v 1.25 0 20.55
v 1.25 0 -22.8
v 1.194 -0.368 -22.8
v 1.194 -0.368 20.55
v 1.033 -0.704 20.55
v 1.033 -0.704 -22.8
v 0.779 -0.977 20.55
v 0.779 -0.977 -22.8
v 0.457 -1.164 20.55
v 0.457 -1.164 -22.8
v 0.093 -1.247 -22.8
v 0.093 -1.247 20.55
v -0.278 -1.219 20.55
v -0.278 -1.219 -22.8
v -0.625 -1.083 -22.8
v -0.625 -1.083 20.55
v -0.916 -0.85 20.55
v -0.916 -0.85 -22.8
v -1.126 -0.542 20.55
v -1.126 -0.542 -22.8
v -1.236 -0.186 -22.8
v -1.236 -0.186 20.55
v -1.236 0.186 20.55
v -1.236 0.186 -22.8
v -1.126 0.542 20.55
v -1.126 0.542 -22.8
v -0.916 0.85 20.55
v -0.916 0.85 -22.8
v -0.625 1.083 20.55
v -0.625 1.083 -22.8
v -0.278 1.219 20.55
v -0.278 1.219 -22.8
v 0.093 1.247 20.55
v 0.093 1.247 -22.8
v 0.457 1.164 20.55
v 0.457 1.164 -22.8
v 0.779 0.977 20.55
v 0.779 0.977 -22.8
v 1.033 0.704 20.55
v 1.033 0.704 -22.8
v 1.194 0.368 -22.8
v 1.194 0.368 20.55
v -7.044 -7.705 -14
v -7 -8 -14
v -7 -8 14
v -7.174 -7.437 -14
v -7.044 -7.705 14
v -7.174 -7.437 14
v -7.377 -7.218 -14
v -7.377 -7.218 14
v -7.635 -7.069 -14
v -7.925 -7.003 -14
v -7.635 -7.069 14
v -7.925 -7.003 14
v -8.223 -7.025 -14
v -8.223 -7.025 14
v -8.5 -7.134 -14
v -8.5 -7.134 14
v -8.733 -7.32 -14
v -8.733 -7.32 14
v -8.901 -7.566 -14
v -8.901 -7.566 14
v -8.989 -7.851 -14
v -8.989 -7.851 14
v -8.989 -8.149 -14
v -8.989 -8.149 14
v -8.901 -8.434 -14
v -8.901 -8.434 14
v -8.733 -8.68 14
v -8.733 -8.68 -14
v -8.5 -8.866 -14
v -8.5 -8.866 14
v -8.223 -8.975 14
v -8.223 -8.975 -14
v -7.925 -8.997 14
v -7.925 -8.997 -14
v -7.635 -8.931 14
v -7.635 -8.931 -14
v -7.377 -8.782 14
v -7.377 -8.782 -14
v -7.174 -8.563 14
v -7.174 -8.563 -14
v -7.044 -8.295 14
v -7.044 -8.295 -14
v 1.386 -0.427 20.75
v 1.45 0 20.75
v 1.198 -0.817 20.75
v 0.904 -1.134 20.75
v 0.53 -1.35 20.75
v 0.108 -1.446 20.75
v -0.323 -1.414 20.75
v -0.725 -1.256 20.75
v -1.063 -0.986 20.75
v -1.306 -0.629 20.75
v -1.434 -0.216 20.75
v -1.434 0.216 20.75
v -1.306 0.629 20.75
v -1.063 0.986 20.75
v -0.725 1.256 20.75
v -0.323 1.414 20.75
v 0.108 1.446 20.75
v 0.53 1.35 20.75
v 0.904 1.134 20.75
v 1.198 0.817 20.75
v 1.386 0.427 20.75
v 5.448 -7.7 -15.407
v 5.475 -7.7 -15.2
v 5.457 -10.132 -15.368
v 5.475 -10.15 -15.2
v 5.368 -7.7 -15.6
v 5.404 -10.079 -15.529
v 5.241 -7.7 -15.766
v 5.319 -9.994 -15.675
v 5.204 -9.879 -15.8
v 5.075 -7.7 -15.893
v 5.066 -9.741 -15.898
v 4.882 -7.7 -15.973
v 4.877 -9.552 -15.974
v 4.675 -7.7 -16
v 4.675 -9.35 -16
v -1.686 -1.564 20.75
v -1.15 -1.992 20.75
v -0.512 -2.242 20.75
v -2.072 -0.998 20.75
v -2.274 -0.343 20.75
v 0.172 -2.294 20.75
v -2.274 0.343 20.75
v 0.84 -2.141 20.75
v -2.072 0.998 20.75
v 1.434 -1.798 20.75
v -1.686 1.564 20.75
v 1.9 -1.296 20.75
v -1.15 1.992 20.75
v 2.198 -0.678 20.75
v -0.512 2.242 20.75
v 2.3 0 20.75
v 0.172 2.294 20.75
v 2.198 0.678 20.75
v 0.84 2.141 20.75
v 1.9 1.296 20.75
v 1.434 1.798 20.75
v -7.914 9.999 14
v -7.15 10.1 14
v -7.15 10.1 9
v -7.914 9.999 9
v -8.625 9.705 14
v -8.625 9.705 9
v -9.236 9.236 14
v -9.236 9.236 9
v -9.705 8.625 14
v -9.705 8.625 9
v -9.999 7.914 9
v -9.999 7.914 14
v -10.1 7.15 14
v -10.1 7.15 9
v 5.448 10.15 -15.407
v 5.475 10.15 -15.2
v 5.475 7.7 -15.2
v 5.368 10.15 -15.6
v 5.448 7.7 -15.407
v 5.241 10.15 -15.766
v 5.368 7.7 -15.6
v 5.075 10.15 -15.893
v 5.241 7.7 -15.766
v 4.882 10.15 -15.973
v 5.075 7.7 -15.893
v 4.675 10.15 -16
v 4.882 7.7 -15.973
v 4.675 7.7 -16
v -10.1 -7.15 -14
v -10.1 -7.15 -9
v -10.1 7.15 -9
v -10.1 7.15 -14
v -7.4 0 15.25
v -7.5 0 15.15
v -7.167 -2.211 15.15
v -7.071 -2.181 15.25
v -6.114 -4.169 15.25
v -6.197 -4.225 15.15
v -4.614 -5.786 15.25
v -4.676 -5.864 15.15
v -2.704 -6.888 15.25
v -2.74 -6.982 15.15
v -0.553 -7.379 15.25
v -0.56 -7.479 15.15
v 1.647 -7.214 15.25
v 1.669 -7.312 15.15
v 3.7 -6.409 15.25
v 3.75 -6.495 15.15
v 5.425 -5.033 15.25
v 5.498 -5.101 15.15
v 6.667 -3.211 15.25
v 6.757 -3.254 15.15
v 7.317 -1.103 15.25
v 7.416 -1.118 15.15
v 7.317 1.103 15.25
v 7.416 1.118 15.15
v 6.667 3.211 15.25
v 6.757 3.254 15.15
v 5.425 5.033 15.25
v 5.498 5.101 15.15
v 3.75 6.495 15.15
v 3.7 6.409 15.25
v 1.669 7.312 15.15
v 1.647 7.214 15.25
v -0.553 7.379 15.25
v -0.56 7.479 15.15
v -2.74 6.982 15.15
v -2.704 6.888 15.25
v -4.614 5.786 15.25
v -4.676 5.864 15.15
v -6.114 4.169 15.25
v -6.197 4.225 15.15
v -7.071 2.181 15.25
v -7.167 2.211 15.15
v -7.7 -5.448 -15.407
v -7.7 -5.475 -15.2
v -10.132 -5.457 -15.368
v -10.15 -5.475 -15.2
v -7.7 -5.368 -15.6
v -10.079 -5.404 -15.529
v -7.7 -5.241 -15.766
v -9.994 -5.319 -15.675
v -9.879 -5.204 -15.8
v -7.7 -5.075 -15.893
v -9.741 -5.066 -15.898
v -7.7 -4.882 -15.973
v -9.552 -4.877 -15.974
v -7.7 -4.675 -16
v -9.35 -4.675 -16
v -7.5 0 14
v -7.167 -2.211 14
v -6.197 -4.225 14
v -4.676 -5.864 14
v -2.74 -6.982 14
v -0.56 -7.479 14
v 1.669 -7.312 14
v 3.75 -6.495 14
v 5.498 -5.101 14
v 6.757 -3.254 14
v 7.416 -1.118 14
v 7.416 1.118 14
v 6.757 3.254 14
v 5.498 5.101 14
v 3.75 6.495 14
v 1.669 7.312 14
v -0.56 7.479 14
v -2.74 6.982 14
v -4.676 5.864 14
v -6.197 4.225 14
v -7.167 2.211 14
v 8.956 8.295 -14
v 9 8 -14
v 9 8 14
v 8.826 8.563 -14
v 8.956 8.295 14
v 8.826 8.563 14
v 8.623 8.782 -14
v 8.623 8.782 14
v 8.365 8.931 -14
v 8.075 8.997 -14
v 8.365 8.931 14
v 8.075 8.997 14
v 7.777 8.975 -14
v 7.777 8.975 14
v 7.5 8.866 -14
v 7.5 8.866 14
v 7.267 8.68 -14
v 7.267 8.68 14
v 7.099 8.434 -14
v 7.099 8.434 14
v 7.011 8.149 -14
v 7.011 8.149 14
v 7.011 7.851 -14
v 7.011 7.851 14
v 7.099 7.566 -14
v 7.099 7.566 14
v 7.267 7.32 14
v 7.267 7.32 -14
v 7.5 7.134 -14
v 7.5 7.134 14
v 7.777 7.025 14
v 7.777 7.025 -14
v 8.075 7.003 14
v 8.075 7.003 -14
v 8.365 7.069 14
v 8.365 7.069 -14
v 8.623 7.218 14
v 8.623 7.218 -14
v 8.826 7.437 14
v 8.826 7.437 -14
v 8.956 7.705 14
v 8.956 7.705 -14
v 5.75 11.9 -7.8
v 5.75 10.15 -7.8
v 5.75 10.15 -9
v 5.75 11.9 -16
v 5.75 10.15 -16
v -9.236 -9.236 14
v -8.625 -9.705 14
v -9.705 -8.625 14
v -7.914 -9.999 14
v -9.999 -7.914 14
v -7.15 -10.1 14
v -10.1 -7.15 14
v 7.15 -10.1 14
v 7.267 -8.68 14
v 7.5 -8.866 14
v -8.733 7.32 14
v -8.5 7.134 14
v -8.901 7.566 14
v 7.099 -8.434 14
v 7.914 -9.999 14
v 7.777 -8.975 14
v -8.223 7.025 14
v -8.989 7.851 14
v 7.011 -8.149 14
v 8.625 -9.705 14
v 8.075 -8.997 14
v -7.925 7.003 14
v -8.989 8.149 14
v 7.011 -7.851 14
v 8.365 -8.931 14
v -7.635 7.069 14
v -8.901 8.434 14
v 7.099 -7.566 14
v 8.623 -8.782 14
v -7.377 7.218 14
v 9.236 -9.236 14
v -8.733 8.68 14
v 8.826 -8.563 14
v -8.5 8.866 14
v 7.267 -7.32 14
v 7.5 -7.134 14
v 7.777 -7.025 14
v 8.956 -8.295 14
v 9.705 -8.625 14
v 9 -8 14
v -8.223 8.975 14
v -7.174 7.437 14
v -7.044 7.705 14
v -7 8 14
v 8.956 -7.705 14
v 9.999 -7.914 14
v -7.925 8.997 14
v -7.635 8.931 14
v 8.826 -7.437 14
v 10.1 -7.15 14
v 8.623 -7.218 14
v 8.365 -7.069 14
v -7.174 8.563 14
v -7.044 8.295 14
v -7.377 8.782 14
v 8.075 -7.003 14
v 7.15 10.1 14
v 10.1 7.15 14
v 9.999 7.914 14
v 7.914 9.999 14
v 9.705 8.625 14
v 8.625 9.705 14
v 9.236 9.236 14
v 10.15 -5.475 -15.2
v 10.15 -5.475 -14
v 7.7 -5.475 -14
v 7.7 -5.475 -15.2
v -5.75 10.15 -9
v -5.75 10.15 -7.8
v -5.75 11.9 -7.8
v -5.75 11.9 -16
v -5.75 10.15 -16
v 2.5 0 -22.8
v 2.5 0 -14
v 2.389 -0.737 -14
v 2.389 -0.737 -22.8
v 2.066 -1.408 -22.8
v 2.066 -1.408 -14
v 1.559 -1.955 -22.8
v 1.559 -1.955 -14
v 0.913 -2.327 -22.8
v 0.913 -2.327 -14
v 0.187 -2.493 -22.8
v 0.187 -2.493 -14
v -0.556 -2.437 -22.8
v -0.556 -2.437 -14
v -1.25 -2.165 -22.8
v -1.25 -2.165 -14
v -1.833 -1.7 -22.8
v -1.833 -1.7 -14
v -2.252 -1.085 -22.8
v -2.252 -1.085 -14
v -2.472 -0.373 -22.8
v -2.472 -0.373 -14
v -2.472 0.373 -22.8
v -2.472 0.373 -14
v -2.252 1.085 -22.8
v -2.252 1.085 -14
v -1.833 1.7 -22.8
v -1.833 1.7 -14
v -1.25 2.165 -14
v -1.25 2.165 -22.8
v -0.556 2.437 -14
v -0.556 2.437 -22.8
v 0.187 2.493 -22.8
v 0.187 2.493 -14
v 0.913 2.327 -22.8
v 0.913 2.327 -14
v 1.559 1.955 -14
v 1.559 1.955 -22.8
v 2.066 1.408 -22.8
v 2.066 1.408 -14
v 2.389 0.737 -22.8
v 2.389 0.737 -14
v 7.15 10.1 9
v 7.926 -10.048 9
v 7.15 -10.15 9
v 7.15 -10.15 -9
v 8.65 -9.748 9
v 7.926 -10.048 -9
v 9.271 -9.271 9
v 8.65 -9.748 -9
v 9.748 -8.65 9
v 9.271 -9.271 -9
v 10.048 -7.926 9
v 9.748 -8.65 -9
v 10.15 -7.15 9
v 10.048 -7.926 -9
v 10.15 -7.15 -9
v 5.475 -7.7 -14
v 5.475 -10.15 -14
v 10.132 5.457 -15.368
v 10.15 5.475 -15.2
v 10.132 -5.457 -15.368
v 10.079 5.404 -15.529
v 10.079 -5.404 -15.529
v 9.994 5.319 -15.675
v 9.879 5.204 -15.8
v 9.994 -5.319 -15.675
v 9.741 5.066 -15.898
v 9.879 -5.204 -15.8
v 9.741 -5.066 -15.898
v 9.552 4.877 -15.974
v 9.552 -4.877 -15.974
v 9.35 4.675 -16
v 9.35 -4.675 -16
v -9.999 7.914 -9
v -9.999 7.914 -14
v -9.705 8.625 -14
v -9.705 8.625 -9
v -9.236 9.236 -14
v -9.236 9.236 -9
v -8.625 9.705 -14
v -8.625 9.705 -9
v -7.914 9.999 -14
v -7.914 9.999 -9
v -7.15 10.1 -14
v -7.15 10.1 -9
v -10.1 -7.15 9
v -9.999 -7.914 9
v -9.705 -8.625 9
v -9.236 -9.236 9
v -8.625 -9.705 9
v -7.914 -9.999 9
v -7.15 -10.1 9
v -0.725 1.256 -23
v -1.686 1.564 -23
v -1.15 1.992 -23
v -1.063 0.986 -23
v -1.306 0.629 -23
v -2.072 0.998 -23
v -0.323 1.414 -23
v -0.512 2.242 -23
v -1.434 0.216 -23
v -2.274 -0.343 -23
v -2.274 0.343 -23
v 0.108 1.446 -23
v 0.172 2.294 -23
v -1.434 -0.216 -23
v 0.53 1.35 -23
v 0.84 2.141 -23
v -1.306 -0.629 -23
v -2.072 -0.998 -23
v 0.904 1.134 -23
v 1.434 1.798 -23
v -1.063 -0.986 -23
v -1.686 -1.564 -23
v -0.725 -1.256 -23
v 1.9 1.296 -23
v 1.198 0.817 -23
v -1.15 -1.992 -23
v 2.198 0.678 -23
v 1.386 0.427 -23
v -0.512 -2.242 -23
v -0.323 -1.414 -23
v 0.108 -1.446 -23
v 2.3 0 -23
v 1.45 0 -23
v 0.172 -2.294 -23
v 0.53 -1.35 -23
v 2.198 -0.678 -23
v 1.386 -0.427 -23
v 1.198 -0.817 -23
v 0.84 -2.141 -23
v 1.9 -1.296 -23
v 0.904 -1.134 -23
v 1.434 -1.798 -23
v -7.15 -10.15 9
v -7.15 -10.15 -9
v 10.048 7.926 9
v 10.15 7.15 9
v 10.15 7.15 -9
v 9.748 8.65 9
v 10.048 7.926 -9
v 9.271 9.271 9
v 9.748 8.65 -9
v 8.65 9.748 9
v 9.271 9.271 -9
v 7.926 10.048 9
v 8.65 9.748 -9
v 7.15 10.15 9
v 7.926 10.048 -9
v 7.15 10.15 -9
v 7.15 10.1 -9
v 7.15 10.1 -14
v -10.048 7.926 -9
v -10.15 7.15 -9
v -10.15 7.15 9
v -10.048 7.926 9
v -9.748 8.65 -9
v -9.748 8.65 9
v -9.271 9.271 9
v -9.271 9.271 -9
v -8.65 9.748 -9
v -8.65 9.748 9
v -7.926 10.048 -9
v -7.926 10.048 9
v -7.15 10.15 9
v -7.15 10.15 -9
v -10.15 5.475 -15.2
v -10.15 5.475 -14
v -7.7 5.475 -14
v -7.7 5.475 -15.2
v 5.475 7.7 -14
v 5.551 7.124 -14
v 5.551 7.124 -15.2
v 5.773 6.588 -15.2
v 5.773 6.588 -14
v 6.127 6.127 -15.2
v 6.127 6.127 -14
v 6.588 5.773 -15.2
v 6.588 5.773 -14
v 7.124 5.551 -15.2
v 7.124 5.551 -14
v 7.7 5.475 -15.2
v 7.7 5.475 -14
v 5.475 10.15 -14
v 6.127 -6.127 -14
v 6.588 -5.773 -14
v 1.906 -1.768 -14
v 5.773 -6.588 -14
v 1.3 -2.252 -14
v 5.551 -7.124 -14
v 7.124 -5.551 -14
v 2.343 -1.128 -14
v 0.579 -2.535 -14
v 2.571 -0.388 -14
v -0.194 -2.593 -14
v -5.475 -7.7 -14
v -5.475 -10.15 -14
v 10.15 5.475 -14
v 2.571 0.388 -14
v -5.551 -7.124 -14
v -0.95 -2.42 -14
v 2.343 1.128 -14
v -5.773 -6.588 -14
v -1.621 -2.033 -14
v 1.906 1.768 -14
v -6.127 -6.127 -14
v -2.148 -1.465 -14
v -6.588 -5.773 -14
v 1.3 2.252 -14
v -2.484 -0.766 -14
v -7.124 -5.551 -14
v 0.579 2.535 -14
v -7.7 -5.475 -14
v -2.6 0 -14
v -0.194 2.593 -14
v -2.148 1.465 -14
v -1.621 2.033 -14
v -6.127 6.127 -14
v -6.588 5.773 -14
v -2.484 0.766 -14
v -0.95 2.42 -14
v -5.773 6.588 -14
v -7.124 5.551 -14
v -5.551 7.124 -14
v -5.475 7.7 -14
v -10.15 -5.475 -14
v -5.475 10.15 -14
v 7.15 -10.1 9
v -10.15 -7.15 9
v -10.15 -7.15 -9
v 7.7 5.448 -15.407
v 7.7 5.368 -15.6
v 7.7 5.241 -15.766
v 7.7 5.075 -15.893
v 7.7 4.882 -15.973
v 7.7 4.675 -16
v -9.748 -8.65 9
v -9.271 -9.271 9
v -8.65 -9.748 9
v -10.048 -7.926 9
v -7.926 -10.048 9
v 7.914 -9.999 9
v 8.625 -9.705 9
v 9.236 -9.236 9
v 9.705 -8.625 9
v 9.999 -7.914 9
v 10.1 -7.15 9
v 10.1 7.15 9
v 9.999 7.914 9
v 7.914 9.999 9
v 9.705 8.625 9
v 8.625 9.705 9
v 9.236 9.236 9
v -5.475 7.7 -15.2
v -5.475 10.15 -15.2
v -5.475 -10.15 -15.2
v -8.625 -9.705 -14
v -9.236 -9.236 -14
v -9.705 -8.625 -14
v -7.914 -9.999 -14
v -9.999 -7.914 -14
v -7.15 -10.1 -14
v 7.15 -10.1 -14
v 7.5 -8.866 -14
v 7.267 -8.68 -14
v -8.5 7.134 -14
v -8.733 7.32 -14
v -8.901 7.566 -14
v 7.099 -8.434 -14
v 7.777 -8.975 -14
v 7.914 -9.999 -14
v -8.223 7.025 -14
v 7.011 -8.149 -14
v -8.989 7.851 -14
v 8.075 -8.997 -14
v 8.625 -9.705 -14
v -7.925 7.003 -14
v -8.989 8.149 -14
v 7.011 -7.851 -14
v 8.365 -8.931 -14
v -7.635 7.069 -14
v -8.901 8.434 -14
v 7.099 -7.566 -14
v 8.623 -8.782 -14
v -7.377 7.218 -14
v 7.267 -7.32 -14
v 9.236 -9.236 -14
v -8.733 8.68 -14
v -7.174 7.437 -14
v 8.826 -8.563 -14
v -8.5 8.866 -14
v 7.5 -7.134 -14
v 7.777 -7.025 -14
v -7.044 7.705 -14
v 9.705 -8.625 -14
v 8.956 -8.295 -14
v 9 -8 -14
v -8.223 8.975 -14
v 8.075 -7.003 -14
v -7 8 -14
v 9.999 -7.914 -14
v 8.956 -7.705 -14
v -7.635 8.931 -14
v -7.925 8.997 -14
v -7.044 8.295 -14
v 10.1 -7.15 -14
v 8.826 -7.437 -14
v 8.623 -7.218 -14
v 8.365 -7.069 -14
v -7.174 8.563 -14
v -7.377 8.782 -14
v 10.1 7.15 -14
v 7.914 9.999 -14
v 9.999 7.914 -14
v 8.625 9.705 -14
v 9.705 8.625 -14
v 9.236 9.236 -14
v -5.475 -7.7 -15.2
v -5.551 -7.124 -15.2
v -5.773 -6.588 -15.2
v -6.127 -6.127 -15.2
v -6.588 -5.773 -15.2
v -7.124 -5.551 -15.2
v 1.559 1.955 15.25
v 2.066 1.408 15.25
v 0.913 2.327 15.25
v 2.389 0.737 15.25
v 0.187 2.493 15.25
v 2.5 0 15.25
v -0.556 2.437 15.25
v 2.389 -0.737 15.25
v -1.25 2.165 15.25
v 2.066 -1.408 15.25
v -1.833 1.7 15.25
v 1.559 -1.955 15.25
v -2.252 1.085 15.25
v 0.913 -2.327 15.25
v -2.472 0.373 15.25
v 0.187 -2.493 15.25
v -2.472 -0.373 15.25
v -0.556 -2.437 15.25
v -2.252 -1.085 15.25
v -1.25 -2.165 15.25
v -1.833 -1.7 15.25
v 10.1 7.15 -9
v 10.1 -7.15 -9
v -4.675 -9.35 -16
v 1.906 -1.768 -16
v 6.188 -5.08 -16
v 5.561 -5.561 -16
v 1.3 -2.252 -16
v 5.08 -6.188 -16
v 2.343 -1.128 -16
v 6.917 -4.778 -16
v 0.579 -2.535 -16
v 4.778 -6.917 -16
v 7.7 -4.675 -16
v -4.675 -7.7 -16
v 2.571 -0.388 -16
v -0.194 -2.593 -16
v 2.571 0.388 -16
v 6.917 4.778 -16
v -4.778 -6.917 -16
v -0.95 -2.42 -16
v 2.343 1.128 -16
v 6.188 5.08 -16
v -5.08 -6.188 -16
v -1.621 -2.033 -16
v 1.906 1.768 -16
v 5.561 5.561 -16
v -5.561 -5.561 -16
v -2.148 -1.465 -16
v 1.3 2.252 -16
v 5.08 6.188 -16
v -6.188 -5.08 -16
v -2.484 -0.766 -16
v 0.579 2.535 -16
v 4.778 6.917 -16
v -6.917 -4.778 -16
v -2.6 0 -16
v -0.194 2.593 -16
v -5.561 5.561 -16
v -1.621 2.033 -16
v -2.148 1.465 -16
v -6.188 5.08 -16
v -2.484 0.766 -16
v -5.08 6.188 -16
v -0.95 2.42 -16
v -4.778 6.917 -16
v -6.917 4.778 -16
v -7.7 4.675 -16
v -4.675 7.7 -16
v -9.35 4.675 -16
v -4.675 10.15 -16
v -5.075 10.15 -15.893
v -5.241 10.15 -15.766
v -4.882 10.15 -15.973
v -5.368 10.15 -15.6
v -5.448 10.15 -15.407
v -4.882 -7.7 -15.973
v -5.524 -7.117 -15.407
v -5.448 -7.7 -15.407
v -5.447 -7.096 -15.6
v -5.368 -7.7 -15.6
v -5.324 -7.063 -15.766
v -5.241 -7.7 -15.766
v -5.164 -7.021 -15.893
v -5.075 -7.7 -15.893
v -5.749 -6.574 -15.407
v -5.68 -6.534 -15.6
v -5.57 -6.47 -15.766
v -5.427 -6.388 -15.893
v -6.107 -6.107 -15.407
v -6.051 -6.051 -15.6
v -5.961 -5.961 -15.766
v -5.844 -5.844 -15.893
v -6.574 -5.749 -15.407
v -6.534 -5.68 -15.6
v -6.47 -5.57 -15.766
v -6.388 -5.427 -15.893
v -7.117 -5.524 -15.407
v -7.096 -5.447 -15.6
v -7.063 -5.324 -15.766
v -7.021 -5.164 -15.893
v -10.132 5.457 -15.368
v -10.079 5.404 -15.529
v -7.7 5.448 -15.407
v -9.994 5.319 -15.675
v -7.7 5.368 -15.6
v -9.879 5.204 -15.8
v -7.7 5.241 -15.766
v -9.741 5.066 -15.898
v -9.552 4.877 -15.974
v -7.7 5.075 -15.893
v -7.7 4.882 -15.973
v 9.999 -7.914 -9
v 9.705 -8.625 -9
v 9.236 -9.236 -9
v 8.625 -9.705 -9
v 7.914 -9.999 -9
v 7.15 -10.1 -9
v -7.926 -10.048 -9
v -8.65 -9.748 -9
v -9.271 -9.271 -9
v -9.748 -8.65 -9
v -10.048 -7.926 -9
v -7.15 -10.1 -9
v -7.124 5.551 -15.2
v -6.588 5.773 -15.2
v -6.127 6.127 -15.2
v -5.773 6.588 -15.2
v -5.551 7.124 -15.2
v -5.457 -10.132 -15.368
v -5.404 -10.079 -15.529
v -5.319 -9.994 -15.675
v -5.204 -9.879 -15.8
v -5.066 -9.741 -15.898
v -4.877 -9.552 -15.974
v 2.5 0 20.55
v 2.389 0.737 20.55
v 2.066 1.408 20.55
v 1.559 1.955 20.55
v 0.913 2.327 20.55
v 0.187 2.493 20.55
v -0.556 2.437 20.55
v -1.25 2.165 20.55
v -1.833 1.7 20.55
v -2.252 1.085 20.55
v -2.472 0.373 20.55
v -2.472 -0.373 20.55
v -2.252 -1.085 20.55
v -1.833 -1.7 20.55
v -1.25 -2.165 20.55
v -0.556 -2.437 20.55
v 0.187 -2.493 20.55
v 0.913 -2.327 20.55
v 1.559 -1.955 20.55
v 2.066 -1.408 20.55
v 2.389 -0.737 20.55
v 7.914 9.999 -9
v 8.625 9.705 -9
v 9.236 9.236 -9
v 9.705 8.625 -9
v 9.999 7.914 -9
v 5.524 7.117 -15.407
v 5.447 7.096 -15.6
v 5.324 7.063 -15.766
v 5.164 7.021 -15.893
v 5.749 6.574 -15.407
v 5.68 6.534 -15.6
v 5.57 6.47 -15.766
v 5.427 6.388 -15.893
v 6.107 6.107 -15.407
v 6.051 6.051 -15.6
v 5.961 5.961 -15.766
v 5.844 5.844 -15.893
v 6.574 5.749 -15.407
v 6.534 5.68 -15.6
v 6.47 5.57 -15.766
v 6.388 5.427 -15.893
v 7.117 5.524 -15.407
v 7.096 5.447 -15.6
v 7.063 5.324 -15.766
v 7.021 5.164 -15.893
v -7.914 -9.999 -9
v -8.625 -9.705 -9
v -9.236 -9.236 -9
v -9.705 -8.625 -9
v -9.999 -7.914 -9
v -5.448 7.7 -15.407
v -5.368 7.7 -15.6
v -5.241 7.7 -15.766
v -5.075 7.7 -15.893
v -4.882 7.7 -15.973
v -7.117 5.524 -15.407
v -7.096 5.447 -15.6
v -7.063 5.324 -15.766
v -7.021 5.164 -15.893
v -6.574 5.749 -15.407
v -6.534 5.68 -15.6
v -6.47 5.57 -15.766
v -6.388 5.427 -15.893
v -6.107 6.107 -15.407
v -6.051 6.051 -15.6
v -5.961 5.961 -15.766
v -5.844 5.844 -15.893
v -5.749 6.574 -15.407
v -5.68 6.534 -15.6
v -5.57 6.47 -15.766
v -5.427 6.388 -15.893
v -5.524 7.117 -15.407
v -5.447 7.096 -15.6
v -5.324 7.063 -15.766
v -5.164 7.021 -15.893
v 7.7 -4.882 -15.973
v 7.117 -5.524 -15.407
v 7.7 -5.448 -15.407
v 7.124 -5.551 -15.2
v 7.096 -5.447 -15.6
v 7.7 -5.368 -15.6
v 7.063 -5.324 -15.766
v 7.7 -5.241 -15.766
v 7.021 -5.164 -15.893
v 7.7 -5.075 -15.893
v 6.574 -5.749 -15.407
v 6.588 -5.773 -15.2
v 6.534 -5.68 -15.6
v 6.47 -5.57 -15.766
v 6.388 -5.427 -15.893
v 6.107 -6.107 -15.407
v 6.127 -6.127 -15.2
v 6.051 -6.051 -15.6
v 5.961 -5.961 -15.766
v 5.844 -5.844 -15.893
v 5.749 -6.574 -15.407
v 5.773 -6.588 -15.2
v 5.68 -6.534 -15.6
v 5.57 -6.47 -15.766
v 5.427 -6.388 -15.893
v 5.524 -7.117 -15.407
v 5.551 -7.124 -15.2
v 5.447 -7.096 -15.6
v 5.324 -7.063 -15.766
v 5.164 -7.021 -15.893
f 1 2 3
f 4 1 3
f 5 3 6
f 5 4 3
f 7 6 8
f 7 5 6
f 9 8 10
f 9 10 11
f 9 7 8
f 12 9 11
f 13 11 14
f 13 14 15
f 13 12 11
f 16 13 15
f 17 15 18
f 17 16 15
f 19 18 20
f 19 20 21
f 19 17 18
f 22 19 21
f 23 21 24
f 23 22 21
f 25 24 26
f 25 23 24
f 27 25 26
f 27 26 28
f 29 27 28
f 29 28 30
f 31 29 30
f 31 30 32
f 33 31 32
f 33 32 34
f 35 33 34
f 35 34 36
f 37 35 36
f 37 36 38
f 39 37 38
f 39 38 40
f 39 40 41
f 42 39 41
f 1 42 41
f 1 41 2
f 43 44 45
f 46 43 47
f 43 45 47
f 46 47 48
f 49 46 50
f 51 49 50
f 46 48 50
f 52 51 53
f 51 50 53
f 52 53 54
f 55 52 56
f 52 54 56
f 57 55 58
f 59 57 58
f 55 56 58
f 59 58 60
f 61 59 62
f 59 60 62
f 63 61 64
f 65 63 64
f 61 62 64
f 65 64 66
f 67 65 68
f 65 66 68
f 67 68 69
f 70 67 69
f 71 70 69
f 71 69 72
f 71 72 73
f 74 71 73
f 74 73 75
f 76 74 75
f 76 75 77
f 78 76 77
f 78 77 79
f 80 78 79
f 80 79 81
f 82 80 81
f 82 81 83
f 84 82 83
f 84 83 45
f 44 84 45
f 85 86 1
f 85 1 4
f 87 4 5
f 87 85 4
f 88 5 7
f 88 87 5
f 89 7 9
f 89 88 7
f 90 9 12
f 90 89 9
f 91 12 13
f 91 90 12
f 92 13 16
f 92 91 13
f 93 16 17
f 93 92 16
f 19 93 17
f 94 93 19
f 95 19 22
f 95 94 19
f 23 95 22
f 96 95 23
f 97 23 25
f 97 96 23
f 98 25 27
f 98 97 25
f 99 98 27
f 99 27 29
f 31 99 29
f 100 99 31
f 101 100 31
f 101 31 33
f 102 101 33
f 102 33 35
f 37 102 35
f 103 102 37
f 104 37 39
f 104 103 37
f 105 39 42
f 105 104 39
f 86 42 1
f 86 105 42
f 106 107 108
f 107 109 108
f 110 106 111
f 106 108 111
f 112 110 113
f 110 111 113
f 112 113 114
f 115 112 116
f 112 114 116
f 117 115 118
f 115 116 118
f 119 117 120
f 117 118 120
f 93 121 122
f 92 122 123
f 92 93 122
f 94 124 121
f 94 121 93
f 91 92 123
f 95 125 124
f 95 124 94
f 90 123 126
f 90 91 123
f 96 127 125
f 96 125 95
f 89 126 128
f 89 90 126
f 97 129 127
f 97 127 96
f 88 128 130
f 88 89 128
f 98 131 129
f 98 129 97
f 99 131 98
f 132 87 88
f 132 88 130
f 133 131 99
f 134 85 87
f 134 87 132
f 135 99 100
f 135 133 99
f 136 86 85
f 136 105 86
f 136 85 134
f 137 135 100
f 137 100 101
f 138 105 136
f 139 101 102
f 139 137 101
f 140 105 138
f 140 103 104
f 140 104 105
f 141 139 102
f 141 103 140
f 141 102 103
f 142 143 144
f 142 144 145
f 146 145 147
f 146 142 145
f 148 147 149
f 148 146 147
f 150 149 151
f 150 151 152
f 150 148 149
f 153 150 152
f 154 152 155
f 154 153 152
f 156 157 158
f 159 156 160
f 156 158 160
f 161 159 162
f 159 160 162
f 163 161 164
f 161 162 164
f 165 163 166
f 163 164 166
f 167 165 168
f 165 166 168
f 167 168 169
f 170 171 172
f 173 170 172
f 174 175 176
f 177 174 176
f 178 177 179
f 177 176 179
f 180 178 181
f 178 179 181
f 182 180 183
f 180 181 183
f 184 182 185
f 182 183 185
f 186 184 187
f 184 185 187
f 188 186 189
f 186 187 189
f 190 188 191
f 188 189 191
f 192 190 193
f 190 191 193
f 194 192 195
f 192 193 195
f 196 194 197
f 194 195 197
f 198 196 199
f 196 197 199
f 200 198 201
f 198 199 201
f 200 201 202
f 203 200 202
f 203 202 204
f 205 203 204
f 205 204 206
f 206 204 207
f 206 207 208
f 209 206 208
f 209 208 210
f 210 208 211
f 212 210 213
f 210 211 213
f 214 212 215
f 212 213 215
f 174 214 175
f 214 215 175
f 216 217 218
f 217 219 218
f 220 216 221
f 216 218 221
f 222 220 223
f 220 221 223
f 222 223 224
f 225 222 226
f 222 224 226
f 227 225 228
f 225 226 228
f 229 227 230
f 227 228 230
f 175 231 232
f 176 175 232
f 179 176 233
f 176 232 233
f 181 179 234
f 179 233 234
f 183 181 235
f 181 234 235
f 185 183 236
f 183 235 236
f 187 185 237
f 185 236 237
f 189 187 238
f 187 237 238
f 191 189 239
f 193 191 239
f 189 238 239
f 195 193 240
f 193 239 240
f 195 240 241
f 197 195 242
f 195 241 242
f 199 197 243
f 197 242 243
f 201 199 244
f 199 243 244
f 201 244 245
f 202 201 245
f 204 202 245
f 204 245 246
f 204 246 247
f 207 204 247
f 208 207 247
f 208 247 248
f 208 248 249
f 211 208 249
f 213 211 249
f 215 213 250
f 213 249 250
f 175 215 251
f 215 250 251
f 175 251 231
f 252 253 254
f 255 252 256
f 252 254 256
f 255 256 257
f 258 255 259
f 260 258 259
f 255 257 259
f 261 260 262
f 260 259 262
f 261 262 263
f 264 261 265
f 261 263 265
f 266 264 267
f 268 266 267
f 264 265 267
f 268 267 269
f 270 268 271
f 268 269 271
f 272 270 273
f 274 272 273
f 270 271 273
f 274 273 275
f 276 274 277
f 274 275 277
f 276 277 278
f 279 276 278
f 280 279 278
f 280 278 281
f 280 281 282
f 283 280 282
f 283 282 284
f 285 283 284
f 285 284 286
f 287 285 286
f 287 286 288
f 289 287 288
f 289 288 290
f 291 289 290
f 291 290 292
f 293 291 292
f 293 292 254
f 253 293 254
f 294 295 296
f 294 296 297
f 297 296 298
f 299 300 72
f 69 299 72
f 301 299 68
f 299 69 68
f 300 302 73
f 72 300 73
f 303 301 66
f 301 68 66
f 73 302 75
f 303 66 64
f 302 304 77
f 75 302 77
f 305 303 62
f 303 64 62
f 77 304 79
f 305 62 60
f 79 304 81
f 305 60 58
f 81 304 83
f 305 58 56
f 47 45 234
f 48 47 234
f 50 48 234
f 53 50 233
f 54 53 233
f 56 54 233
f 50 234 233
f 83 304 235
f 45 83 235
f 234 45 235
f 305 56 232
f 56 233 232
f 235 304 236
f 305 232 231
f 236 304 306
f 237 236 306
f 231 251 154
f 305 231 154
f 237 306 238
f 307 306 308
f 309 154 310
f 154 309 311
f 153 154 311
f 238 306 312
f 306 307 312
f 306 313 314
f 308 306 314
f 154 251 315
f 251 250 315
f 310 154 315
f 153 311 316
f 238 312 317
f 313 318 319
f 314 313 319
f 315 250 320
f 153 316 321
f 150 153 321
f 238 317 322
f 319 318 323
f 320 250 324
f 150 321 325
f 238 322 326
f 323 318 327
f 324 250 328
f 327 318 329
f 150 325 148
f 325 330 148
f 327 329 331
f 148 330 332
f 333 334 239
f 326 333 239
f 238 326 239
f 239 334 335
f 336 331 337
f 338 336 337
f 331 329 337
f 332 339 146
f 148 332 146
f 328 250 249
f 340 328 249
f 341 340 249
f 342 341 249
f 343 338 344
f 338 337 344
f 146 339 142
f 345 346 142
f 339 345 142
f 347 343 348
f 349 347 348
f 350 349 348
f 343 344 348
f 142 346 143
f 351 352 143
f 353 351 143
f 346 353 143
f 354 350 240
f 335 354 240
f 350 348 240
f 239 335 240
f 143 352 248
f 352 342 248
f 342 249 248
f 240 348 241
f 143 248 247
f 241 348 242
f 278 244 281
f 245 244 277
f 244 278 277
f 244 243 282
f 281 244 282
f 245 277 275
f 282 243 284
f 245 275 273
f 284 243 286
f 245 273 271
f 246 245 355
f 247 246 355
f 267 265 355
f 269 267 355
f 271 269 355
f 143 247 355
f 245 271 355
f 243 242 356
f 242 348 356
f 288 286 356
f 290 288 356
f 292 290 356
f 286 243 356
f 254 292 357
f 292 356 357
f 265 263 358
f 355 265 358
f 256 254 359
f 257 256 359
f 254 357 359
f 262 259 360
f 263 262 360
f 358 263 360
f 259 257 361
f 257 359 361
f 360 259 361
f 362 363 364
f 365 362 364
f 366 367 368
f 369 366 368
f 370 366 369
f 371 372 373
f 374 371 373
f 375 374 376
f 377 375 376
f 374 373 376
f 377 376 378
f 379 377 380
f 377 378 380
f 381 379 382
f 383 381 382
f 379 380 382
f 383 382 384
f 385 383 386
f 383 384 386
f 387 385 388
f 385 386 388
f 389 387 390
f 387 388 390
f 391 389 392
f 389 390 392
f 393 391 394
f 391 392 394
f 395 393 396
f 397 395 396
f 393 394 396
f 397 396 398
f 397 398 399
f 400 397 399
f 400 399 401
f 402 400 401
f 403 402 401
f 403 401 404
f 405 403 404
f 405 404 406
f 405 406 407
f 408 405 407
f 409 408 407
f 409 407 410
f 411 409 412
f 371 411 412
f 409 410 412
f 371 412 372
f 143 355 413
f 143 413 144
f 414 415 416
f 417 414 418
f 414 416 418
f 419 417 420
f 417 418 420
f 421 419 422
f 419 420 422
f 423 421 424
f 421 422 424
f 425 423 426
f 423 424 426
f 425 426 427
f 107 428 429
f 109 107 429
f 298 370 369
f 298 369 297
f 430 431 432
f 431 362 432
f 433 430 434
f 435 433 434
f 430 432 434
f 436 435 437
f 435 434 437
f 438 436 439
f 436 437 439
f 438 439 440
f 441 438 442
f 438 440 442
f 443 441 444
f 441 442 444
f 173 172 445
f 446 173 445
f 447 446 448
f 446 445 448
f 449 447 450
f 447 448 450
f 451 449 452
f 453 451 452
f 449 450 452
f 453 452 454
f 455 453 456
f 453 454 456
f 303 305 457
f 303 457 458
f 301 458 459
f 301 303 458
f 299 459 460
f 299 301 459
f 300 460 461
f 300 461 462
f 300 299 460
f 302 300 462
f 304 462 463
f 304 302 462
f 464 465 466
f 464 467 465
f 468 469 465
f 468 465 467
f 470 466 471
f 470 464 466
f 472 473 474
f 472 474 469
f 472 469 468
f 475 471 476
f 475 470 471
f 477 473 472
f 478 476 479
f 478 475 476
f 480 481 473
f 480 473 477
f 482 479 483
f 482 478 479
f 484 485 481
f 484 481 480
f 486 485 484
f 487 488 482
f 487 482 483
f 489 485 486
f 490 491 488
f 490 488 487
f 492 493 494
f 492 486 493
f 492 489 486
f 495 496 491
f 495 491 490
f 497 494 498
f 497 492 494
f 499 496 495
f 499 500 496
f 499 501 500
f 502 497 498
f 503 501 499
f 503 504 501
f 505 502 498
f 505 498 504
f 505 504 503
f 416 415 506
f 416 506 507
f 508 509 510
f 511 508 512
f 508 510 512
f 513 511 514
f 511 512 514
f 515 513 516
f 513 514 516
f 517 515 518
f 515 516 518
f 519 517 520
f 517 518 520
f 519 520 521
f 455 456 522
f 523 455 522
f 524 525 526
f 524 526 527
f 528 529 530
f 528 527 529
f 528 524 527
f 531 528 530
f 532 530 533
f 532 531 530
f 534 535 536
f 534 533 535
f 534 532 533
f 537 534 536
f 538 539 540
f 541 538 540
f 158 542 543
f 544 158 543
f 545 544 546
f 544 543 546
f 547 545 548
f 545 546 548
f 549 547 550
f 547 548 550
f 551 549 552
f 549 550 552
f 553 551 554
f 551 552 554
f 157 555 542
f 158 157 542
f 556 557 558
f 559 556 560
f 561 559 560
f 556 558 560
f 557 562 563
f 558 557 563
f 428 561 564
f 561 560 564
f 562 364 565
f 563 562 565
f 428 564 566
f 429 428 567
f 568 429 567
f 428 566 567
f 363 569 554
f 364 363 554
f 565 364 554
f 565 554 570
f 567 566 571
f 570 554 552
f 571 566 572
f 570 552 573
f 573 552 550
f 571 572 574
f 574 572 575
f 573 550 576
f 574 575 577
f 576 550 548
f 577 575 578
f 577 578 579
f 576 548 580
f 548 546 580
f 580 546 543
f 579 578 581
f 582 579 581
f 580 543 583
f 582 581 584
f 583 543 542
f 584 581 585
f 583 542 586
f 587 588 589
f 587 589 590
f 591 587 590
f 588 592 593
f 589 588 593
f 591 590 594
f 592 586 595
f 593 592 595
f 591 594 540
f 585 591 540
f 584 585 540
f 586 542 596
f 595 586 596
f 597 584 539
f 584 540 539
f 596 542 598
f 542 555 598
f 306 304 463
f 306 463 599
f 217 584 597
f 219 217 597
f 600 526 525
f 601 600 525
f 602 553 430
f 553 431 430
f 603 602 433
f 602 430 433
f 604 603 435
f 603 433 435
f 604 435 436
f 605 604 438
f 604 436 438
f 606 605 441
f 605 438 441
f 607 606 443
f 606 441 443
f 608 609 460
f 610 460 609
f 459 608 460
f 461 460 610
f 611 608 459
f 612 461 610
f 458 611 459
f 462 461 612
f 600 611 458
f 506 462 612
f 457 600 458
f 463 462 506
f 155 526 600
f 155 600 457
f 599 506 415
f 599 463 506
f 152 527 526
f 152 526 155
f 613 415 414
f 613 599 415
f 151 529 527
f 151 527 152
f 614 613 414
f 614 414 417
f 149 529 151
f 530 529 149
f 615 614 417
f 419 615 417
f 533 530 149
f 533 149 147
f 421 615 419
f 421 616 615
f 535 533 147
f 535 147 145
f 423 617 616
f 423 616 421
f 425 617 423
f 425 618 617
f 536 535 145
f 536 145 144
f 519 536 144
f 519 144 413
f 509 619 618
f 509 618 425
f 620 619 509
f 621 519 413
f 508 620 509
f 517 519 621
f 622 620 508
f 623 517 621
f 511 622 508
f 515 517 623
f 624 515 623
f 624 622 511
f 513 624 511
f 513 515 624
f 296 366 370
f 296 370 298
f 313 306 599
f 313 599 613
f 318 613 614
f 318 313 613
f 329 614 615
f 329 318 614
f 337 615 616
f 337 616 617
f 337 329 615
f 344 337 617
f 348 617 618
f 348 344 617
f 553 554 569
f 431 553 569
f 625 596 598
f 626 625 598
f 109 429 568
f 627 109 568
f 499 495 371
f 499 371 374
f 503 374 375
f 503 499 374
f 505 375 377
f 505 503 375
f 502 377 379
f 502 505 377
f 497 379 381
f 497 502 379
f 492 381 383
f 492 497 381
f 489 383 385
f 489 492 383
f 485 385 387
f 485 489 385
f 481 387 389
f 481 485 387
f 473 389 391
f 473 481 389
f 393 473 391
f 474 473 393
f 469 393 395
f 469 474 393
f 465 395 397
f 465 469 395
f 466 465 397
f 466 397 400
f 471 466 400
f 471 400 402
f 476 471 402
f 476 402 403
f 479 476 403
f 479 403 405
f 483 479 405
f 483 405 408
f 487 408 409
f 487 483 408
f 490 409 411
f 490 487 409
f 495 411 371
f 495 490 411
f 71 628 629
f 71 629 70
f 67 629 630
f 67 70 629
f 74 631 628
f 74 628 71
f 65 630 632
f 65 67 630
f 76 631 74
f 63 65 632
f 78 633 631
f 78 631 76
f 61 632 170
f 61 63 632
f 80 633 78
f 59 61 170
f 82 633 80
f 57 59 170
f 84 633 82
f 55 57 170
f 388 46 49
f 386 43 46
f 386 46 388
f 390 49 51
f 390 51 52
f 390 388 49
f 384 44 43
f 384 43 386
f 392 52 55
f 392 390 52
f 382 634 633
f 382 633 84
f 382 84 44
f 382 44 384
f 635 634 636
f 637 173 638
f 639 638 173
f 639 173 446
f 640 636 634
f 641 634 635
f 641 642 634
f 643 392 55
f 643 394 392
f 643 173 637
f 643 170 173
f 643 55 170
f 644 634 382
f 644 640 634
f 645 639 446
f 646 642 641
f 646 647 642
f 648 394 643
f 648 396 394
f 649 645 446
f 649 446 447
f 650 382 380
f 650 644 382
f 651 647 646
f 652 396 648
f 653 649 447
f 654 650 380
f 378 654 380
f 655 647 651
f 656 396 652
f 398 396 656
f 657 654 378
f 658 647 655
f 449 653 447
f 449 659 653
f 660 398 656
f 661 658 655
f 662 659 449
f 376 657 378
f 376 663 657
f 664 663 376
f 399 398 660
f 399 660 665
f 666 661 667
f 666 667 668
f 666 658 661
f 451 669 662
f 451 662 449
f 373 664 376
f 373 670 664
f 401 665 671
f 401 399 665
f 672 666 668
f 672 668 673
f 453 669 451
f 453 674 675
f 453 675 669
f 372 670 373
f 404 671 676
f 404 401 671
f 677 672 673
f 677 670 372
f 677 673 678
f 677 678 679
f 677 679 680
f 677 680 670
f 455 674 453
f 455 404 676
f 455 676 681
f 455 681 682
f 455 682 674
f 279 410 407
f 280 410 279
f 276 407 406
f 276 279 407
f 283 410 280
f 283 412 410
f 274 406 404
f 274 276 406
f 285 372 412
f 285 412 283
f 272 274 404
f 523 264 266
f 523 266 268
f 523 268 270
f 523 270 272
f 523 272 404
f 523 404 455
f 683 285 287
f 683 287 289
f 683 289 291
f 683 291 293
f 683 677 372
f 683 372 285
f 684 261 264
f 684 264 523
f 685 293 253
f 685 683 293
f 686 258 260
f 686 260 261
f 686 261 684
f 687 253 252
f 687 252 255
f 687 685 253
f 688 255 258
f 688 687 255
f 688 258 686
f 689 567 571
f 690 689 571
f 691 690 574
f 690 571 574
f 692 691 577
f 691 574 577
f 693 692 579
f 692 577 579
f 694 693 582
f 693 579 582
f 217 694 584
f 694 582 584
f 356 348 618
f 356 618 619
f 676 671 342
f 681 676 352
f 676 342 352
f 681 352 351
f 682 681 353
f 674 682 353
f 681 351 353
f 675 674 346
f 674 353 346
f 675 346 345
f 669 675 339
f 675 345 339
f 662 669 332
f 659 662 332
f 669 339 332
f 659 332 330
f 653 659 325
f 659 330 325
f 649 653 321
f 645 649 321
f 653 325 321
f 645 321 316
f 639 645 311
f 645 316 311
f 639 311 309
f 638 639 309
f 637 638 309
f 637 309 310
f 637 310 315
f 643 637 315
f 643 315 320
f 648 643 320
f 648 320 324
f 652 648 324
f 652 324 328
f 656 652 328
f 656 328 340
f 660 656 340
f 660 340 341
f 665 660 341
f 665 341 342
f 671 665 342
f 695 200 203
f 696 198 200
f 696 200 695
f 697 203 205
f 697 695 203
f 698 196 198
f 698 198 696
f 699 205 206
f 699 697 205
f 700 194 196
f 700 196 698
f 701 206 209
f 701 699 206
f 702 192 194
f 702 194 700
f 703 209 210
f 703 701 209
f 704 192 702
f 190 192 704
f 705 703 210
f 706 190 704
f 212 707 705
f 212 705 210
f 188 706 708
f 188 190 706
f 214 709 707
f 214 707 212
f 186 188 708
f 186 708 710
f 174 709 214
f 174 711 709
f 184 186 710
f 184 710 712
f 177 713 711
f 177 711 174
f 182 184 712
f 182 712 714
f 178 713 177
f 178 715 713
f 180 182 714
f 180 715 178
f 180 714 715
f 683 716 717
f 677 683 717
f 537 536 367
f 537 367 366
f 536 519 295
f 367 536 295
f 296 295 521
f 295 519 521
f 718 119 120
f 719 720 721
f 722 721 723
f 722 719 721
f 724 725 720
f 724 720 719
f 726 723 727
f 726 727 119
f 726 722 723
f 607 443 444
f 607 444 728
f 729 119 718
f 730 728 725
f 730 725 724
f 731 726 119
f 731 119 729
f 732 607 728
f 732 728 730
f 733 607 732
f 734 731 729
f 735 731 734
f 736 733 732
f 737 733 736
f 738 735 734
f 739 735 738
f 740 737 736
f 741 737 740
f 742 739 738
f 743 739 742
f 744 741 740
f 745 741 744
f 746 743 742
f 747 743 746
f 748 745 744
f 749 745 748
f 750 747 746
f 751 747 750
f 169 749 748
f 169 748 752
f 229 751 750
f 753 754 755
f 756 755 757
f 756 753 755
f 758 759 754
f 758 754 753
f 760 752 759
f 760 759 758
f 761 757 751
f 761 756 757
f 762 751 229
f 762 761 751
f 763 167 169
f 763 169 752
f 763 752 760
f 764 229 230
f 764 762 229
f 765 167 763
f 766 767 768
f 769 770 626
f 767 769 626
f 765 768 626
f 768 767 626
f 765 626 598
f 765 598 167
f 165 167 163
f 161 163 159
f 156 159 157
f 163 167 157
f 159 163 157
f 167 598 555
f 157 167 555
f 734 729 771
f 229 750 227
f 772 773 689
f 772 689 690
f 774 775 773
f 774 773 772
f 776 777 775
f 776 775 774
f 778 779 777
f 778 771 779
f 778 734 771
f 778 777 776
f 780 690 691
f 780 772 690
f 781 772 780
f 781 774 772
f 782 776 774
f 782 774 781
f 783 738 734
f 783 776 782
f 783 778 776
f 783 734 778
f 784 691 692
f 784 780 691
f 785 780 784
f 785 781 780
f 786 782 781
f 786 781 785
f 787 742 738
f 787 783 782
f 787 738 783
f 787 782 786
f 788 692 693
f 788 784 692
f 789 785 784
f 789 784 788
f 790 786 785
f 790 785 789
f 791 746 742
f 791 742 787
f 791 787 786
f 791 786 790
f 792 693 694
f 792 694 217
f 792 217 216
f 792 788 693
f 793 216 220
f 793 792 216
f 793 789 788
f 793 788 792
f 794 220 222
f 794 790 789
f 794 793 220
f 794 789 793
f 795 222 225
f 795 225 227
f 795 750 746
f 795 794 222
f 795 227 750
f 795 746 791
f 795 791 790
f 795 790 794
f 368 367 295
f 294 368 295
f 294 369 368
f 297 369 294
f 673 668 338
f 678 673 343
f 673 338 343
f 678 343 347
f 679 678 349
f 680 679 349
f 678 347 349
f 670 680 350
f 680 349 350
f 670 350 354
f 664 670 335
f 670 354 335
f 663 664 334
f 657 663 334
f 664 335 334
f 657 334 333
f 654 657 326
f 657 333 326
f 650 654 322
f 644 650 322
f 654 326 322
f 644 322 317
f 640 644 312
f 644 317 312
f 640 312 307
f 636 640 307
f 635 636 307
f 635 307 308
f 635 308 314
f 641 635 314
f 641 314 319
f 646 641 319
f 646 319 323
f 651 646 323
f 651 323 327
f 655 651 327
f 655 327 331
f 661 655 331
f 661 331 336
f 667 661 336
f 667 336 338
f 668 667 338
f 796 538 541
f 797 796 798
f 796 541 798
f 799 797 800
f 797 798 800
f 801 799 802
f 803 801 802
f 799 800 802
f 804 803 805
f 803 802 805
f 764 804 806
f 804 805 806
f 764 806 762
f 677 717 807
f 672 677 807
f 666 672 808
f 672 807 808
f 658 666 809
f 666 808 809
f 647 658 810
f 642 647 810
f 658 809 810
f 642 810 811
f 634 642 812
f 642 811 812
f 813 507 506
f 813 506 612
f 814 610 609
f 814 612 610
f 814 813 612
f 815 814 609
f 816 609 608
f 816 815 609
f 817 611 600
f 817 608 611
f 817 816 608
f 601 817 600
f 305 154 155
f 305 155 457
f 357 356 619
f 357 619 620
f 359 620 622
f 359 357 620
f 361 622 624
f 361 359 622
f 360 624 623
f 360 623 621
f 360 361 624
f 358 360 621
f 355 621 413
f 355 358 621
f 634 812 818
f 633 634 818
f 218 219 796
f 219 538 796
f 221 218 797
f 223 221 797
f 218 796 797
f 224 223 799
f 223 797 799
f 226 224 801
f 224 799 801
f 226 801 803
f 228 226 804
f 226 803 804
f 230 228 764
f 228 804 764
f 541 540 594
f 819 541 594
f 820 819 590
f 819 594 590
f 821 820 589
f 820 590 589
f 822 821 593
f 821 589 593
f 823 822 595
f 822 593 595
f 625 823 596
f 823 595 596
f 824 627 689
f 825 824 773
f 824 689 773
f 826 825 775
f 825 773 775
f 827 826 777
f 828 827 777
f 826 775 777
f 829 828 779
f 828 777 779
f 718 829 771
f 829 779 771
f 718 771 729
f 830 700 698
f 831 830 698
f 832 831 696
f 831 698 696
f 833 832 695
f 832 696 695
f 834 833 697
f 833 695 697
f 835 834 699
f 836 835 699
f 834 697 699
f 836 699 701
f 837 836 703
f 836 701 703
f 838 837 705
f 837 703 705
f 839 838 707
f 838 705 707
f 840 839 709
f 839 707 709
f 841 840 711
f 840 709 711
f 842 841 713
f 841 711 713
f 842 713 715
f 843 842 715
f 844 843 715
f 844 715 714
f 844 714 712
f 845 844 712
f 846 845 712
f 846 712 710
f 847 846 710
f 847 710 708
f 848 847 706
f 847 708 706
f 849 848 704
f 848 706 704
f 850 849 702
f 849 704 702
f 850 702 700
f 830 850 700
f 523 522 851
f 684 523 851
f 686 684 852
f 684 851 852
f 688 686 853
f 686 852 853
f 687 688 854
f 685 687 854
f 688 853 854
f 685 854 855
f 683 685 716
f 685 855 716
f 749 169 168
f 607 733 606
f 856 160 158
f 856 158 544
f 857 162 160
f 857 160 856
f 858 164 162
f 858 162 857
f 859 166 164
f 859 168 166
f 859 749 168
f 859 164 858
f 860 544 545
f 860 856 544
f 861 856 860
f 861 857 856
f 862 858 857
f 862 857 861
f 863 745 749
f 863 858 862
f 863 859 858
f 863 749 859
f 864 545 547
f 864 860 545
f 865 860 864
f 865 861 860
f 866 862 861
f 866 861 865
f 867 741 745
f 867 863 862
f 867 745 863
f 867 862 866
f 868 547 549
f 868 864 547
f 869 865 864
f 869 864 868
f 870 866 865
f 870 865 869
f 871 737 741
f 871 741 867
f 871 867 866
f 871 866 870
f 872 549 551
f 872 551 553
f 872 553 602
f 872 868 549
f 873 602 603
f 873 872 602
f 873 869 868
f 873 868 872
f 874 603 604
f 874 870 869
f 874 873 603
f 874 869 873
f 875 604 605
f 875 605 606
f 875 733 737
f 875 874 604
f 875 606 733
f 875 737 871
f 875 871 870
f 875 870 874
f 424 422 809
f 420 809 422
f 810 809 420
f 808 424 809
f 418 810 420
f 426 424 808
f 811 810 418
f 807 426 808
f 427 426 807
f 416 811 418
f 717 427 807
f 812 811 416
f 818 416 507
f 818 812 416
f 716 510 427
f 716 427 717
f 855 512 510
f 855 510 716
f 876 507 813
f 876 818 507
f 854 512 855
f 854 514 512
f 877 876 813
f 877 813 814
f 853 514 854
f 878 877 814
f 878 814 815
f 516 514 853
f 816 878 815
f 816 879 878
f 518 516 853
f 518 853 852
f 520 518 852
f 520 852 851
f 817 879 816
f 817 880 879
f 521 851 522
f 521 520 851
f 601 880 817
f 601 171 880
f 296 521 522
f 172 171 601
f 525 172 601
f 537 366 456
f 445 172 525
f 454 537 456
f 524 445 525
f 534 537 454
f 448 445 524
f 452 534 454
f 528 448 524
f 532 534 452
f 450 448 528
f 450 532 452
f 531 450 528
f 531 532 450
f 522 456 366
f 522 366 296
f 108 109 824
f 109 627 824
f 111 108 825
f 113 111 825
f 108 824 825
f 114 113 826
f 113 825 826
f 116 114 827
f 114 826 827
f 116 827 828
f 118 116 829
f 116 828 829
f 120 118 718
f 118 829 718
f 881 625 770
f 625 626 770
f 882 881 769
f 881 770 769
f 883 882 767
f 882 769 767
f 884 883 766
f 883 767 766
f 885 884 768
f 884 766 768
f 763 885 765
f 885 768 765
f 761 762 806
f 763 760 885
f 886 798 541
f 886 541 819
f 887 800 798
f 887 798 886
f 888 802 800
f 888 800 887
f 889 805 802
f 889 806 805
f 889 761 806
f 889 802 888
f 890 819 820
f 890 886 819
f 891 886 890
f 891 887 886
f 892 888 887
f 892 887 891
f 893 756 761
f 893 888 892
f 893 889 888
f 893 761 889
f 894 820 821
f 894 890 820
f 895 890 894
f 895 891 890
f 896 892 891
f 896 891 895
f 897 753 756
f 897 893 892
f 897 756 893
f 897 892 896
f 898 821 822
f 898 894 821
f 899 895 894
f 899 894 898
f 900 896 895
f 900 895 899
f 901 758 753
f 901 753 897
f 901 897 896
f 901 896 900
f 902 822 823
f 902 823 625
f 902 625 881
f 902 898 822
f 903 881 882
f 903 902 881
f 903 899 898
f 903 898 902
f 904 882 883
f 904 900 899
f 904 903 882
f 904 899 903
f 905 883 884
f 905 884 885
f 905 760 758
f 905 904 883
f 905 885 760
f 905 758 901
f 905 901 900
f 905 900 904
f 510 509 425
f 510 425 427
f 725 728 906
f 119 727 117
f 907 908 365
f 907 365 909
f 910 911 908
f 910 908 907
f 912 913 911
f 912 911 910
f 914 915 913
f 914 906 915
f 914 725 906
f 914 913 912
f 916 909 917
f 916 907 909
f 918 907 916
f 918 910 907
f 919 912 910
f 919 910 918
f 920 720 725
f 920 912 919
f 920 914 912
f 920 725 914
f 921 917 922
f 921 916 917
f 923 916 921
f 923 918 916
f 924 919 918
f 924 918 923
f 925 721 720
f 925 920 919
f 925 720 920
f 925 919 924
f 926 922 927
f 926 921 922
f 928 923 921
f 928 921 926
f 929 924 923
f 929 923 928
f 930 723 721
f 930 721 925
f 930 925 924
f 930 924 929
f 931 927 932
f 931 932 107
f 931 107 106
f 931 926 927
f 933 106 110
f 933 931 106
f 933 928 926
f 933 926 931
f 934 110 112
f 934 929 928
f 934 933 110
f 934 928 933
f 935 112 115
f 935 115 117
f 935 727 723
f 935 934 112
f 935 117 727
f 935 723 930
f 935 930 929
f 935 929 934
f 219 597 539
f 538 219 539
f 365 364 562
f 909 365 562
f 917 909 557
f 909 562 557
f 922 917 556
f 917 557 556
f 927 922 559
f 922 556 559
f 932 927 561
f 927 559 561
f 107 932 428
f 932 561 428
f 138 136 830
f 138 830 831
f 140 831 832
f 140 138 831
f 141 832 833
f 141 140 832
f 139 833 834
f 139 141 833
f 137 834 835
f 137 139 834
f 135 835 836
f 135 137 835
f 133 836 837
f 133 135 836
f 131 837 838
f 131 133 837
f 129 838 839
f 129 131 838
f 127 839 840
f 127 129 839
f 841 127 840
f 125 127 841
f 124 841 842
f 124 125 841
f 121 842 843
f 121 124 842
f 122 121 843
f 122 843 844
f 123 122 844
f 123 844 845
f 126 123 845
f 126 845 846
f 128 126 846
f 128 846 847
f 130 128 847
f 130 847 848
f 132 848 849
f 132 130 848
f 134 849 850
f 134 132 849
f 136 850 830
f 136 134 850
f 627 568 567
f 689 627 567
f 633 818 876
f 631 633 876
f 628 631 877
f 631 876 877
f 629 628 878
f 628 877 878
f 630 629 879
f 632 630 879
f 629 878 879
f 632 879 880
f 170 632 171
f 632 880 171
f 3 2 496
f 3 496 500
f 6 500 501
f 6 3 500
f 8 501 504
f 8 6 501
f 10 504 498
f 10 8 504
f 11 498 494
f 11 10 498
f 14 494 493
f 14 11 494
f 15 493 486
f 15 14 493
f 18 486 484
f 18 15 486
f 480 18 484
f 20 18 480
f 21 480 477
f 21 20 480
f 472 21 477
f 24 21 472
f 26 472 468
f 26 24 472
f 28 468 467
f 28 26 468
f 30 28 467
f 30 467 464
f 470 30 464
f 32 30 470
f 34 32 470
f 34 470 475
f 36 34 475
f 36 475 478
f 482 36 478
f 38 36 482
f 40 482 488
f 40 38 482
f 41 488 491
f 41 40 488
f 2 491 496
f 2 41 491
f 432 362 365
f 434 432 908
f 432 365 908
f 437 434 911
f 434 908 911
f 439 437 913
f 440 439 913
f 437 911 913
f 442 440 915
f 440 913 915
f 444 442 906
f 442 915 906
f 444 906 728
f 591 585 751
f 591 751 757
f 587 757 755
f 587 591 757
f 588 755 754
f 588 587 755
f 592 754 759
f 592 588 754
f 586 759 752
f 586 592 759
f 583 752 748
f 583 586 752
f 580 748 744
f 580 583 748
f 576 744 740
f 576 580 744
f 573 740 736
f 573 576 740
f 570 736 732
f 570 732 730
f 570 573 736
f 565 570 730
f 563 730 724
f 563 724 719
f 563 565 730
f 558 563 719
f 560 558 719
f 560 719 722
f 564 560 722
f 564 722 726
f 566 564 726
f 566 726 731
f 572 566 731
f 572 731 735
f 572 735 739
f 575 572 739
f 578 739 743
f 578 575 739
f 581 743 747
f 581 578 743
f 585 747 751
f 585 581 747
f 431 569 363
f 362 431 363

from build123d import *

# Parameters (mm, degrees)
SKETCH1_W               = 28
SKETCH1_H               = 20.3
BOSS_EXTRUDE1_DEPTH     = 10.15
SKETCH2_R               = 7.5
BOSS_EXTRUDE2_DEPTH     = 1.25
SKETCH3_R               = 2.5
BOSS_EXTRUDE3_DEPTH     = 5.5
CUT_EXTRUDE1_DEPTH      = 38.59797202
CUT_EXTRUDE1_DEPTH_BACK = 38.59797202
SKETCH4_R               = 1.25
CHAMFER1_SIZE           = 0.2
SKETCH6_R               = 2.5
SKETCH6_R_2             = 1.25
BOSS_EXTRUDE4_DEPTH     = 9
CHAMFER4_SIZE           = 0.2
SKETCH7_R               = 1
CUT_EXTRUDE2_DEPTH      = 40.686836609
FILLET1_R               = 3
SKETCH10_R              = 2.6
BOSS_EXTRUDE5_DEPTH     = 2
FILLET2_R               = 0.8
SKETCH13_W              = 11.5
SKETCH13_H              = 8.2
BOSS_EXTRUDE7_DEPTH     = 1.75
CUT_EXTRUDE5_DEPTH      = 5
CUT_EXTRUDE6_START      = -5
CUT_EXTRUDE6_DEPTH      = 5
CHAMFER5_SIZE           = 0.1


with BuildPart() as part:
    # Sketch1 → Boss-Extrude1 (new, symmetric)
    with BuildSketch(Plane(origin=(0, 0, 0), x_dir=(0, 0, -1), z_dir=(1, 0, 0))):
        Rectangle(SKETCH1_W, SKETCH1_H)
    extrude(amount=BOSS_EXTRUDE1_DEPTH, both=True)

    # Sketch2 → Boss-Extrude2 (add)
    with BuildSketch(Plane.XY.offset(14)):
        with Locations(Location((0, 0, 0), (0, 0, 180))):
            Circle(SKETCH2_R)
    extrude(amount=BOSS_EXTRUDE2_DEPTH)

    # Sketch3 → Boss-Extrude3 (add)
    with BuildSketch(Plane.XY.offset(15.25)):
        Circle(SKETCH3_R)
    extrude(amount=BOSS_EXTRUDE3_DEPTH)

    # Sketch4 → Cut-Extrude1 (cut, two sides: drawn at the far end of the back side and taken through both)
    with BuildSketch(Plane.XY.offset(20.75).offset(-CUT_EXTRUDE1_DEPTH_BACK)):
        Circle(SKETCH4_R)
    extrude(amount=CUT_EXTRUDE1_DEPTH + CUT_EXTRUDE1_DEPTH_BACK, mode=Mode.SUBTRACT)

    # Chamfer1
    chamfer1_edges = [part.edges().sort_by_distance(p)[0] for p in [
        (-2.5, 0, 20.75),
        (-1.25, 0, 20.75),
    ]]
    chamfer(chamfer1_edges, length=CHAMFER1_SIZE)

    # Sketch6 → Boss-Extrude4 (add)
    with BuildSketch(Plane(origin=(0, 0, -14), x_dir=(-1, 0, 0), z_dir=(0, 0, -1))):
        with Locations(Location((0, 0, 0), (0, 0, 180))):
            Circle(SKETCH6_R)
        with Locations(Location((0, 0, 0), (0, 0, 180))):
            Circle(SKETCH6_R_2, mode=Mode.SUBTRACT)
    extrude(amount=BOSS_EXTRUDE4_DEPTH)

    # Chamfer4
    chamfer4_edges = [part.edges().sort_by_distance(p)[0] for p in [
        (-2.5, 0, -23),
        (-1.25, 0, -23),
    ]]
    chamfer(chamfer4_edges, length=CHAMFER4_SIZE)

    # Sketch7 → Cut-Extrude2 (cut, through all)
    with BuildSketch(Plane.XY.offset(14)):
        with Locations((-8, 8)):
            Circle(SKETCH7_R)
        with Locations((8, 8)):
            Circle(SKETCH7_R)
        with Locations((8, -8)):
            Circle(SKETCH7_R)
        with Locations((-8, -8)):
            Circle(SKETCH7_R)
    extrude(amount=-CUT_EXTRUDE2_DEPTH, mode=Mode.SUBTRACT)

    # Fillet1
    fillet1_edges = [part.edges().sort_by_distance(p)[0] for p in [
        (10.15, -10.15, 0),
        (-10.15, -10.15, 0),
        (-10.15, 10.15, 0),
        (10.15, 10.15, 0),
    ]]
    fillet(fillet1_edges, radius=FILLET1_R)

    # Sketch13 → Boss-Extrude7 (add)
    with BuildSketch(Plane(origin=(0, 10.15, 0), x_dir=(1, 0, 0), z_dir=(0, 1, 0))):
        with Locations((0, 11.9)):
            Rectangle(SKETCH13_W, SKETCH13_H)
    extrude(amount=BOSS_EXTRUDE7_DEPTH)

    # Sketch14 → Cut-Extrude5 (cut)
    with BuildSketch(Plane.XY.offset(14)):
        with BuildLine():
            Line((10.15, -7.15), (10.15, 7.15))
            ThreePointArc((10.15, 7.15), (9.271320344, 9.271320344), (7.15, 10.15))
            Line((7.15, 10.15), (-7.15, 10.15))
            ThreePointArc((-7.15, 10.15), (-9.271320344, 9.271320344), (-10.15, 7.15))
            Line((-10.15, 7.15), (-10.15, -7.15))
            ThreePointArc((-10.15, -7.15), (-9.271320344, -9.271320344), (-7.15, -10.15))
            Line((-7.15, -10.15), (7.15, -10.15))
            ThreePointArc((7.15, -10.15), (9.271320344, -9.271320344), (10.15, -7.15))
        make_face()
        with BuildLine():
            Line((10.1, -7.15), (10.1, 7.15))
            ThreePointArc((10.1, 7.15), (9.235965005, 9.235965005), (7.15, 10.1))
            Line((7.15, 10.1), (-7.15, 10.1))
            ThreePointArc((-7.15, 10.1), (-9.235965005, 9.235965005), (-10.1, 7.15))
            Line((-10.1, 7.15), (-10.1, -7.15))
            ThreePointArc((-10.1, -7.15), (-9.235965005, -9.235965005), (-7.15, -10.1))
            Line((-7.15, -10.1), (7.15, -10.1))
            ThreePointArc((7.15, -10.1), (9.235965005, -9.235965005), (10.1, -7.15))
        make_face(mode=Mode.SUBTRACT)
    extrude(amount=-CUT_EXTRUDE5_DEPTH, mode=Mode.SUBTRACT)

    # Sketch15 → Cut-Extrude6 (cut)
    with BuildSketch(Plane(origin=(0, 0, -14), x_dir=(-1, 0, 0), z_dir=(0, 0, -1)).offset(CUT_EXTRUDE6_START)):
        with BuildLine():
            Line((7.15, 10.15), (5.75, 10.15))
            Line((5.75, 10.15), (-5.75, 10.15))
            Line((-5.75, 10.15), (-7.15, 10.15))
            ThreePointArc((-7.15, 10.15), (-9.271320344, 9.271320344), (-10.15, 7.15))
            Line((-10.15, 7.15), (-10.15, -7.15))
            ThreePointArc((-10.15, -7.15), (-9.271320344, -9.271320344), (-7.15, -10.15))
            Line((-7.15, -10.15), (7.15, -10.15))
            ThreePointArc((7.15, -10.15), (9.271320344, -9.271320344), (10.15, -7.15))
            Line((10.15, -7.15), (10.15, 7.15))
            ThreePointArc((10.15, 7.15), (9.271320344, 9.271320344), (7.15, 10.15))
        make_face()
        with BuildLine():
            Line((-10.1, 7.15), (-10.1, -7.15))
            ThreePointArc((-10.1, -7.15), (-9.235965005, -9.235965005), (-7.15, -10.1))
            Line((-7.15, -10.1), (7.15, -10.1))
            ThreePointArc((7.15, -10.1), (9.235965005, -9.235965005), (10.1, -7.15))
            Line((10.1, -7.15), (10.1, 7.15))
            ThreePointArc((10.1, 7.15), (9.235965005, 9.235965005), (7.15, 10.1))
            Line((7.15, 10.1), (-7.15, 10.1))
            ThreePointArc((-7.15, 10.1), (-9.235965005, 9.235965005), (-10.1, 7.15))
        make_face(mode=Mode.SUBTRACT)
    extrude(amount=CUT_EXTRUDE6_DEPTH, mode=Mode.SUBTRACT)

    # Chamfer5
    chamfer5_edges = [part.edges().sort_by_distance(p)[0] for p in [
        (7.5, 0, 15.25),
    ]]
    chamfer(chamfer5_edges, length=CHAMFER5_SIZE)


with BuildPart() as body_2:
    # Sketch10 → Boss-Extrude5 (new body)
    with BuildSketch(Plane(origin=(0, 0, -14), x_dir=(-1, 0, 0), z_dir=(0, 0, -1))):
        with BuildLine():
            Line((-7.7, 5.475), (-10.15, 5.475))
            Line((-10.15, 5.475), (-10.15, -5.475))
            Line((-10.15, -5.475), (-7.7, -5.475))
            ThreePointArc((-7.7, -5.475), (-6.126687412, -6.126687412), (-5.475, -7.7))
            Line((-5.475, -7.7), (-5.475, -10.15))
            Line((-5.475, -10.15), (5.475, -10.15))
            Line((5.475, -10.15), (5.475, -7.7))
            ThreePointArc((5.475, -7.7), (6.126687412, -6.126687412), (7.7, -5.475))
            Line((7.7, -5.475), (10.15, -5.475))
            Line((10.15, -5.475), (10.15, 5.475))
            Line((10.15, 5.475), (7.7, 5.475))
            ThreePointArc((7.7, 5.475), (6.126687412, 6.126687412), (5.475, 7.7))
            Line((5.475, 7.7), (5.475, 10.15))
            Line((5.475, 10.15), (-5.475, 10.15))
            Line((-5.475, 10.15), (-5.475, 7.7))
            ThreePointArc((-5.475, 7.7), (-6.126687412, 6.126687412), (-7.7, 5.475))
        make_face()
        Circle(SKETCH10_R, mode=Mode.SUBTRACT)
    extrude(amount=BOSS_EXTRUDE5_DEPTH)

    # Fillet2
    fillet2_edges = [body_2.edges().sort_by_distance(p)[0] for p in [
        (5.475, 8.925, -16),
        (6.126687412, 6.126687412, -16),
        (8.925, 5.475, -16),
        (10.15, 0, -16),
        (8.925, -5.475, -16),
        (6.126687412, -6.126687412, -16),
        (5.475, -8.925, -16),
        (0, -10.15, -16),
        (-5.475, -8.925, -16),
        (-6.126687412, -6.126687412, -16),
        (-8.925, -5.475, -16),
        (-10.15, 0, -16),
        (-8.925, 5.475, -16),
        (-6.126687412, 6.126687412, -16),
        (-5.475, 8.925, -16),
    ]]
    fillet(fillet2_edges, radius=FILLET2_R)


solid = Compound([part.part, body_2.part])
